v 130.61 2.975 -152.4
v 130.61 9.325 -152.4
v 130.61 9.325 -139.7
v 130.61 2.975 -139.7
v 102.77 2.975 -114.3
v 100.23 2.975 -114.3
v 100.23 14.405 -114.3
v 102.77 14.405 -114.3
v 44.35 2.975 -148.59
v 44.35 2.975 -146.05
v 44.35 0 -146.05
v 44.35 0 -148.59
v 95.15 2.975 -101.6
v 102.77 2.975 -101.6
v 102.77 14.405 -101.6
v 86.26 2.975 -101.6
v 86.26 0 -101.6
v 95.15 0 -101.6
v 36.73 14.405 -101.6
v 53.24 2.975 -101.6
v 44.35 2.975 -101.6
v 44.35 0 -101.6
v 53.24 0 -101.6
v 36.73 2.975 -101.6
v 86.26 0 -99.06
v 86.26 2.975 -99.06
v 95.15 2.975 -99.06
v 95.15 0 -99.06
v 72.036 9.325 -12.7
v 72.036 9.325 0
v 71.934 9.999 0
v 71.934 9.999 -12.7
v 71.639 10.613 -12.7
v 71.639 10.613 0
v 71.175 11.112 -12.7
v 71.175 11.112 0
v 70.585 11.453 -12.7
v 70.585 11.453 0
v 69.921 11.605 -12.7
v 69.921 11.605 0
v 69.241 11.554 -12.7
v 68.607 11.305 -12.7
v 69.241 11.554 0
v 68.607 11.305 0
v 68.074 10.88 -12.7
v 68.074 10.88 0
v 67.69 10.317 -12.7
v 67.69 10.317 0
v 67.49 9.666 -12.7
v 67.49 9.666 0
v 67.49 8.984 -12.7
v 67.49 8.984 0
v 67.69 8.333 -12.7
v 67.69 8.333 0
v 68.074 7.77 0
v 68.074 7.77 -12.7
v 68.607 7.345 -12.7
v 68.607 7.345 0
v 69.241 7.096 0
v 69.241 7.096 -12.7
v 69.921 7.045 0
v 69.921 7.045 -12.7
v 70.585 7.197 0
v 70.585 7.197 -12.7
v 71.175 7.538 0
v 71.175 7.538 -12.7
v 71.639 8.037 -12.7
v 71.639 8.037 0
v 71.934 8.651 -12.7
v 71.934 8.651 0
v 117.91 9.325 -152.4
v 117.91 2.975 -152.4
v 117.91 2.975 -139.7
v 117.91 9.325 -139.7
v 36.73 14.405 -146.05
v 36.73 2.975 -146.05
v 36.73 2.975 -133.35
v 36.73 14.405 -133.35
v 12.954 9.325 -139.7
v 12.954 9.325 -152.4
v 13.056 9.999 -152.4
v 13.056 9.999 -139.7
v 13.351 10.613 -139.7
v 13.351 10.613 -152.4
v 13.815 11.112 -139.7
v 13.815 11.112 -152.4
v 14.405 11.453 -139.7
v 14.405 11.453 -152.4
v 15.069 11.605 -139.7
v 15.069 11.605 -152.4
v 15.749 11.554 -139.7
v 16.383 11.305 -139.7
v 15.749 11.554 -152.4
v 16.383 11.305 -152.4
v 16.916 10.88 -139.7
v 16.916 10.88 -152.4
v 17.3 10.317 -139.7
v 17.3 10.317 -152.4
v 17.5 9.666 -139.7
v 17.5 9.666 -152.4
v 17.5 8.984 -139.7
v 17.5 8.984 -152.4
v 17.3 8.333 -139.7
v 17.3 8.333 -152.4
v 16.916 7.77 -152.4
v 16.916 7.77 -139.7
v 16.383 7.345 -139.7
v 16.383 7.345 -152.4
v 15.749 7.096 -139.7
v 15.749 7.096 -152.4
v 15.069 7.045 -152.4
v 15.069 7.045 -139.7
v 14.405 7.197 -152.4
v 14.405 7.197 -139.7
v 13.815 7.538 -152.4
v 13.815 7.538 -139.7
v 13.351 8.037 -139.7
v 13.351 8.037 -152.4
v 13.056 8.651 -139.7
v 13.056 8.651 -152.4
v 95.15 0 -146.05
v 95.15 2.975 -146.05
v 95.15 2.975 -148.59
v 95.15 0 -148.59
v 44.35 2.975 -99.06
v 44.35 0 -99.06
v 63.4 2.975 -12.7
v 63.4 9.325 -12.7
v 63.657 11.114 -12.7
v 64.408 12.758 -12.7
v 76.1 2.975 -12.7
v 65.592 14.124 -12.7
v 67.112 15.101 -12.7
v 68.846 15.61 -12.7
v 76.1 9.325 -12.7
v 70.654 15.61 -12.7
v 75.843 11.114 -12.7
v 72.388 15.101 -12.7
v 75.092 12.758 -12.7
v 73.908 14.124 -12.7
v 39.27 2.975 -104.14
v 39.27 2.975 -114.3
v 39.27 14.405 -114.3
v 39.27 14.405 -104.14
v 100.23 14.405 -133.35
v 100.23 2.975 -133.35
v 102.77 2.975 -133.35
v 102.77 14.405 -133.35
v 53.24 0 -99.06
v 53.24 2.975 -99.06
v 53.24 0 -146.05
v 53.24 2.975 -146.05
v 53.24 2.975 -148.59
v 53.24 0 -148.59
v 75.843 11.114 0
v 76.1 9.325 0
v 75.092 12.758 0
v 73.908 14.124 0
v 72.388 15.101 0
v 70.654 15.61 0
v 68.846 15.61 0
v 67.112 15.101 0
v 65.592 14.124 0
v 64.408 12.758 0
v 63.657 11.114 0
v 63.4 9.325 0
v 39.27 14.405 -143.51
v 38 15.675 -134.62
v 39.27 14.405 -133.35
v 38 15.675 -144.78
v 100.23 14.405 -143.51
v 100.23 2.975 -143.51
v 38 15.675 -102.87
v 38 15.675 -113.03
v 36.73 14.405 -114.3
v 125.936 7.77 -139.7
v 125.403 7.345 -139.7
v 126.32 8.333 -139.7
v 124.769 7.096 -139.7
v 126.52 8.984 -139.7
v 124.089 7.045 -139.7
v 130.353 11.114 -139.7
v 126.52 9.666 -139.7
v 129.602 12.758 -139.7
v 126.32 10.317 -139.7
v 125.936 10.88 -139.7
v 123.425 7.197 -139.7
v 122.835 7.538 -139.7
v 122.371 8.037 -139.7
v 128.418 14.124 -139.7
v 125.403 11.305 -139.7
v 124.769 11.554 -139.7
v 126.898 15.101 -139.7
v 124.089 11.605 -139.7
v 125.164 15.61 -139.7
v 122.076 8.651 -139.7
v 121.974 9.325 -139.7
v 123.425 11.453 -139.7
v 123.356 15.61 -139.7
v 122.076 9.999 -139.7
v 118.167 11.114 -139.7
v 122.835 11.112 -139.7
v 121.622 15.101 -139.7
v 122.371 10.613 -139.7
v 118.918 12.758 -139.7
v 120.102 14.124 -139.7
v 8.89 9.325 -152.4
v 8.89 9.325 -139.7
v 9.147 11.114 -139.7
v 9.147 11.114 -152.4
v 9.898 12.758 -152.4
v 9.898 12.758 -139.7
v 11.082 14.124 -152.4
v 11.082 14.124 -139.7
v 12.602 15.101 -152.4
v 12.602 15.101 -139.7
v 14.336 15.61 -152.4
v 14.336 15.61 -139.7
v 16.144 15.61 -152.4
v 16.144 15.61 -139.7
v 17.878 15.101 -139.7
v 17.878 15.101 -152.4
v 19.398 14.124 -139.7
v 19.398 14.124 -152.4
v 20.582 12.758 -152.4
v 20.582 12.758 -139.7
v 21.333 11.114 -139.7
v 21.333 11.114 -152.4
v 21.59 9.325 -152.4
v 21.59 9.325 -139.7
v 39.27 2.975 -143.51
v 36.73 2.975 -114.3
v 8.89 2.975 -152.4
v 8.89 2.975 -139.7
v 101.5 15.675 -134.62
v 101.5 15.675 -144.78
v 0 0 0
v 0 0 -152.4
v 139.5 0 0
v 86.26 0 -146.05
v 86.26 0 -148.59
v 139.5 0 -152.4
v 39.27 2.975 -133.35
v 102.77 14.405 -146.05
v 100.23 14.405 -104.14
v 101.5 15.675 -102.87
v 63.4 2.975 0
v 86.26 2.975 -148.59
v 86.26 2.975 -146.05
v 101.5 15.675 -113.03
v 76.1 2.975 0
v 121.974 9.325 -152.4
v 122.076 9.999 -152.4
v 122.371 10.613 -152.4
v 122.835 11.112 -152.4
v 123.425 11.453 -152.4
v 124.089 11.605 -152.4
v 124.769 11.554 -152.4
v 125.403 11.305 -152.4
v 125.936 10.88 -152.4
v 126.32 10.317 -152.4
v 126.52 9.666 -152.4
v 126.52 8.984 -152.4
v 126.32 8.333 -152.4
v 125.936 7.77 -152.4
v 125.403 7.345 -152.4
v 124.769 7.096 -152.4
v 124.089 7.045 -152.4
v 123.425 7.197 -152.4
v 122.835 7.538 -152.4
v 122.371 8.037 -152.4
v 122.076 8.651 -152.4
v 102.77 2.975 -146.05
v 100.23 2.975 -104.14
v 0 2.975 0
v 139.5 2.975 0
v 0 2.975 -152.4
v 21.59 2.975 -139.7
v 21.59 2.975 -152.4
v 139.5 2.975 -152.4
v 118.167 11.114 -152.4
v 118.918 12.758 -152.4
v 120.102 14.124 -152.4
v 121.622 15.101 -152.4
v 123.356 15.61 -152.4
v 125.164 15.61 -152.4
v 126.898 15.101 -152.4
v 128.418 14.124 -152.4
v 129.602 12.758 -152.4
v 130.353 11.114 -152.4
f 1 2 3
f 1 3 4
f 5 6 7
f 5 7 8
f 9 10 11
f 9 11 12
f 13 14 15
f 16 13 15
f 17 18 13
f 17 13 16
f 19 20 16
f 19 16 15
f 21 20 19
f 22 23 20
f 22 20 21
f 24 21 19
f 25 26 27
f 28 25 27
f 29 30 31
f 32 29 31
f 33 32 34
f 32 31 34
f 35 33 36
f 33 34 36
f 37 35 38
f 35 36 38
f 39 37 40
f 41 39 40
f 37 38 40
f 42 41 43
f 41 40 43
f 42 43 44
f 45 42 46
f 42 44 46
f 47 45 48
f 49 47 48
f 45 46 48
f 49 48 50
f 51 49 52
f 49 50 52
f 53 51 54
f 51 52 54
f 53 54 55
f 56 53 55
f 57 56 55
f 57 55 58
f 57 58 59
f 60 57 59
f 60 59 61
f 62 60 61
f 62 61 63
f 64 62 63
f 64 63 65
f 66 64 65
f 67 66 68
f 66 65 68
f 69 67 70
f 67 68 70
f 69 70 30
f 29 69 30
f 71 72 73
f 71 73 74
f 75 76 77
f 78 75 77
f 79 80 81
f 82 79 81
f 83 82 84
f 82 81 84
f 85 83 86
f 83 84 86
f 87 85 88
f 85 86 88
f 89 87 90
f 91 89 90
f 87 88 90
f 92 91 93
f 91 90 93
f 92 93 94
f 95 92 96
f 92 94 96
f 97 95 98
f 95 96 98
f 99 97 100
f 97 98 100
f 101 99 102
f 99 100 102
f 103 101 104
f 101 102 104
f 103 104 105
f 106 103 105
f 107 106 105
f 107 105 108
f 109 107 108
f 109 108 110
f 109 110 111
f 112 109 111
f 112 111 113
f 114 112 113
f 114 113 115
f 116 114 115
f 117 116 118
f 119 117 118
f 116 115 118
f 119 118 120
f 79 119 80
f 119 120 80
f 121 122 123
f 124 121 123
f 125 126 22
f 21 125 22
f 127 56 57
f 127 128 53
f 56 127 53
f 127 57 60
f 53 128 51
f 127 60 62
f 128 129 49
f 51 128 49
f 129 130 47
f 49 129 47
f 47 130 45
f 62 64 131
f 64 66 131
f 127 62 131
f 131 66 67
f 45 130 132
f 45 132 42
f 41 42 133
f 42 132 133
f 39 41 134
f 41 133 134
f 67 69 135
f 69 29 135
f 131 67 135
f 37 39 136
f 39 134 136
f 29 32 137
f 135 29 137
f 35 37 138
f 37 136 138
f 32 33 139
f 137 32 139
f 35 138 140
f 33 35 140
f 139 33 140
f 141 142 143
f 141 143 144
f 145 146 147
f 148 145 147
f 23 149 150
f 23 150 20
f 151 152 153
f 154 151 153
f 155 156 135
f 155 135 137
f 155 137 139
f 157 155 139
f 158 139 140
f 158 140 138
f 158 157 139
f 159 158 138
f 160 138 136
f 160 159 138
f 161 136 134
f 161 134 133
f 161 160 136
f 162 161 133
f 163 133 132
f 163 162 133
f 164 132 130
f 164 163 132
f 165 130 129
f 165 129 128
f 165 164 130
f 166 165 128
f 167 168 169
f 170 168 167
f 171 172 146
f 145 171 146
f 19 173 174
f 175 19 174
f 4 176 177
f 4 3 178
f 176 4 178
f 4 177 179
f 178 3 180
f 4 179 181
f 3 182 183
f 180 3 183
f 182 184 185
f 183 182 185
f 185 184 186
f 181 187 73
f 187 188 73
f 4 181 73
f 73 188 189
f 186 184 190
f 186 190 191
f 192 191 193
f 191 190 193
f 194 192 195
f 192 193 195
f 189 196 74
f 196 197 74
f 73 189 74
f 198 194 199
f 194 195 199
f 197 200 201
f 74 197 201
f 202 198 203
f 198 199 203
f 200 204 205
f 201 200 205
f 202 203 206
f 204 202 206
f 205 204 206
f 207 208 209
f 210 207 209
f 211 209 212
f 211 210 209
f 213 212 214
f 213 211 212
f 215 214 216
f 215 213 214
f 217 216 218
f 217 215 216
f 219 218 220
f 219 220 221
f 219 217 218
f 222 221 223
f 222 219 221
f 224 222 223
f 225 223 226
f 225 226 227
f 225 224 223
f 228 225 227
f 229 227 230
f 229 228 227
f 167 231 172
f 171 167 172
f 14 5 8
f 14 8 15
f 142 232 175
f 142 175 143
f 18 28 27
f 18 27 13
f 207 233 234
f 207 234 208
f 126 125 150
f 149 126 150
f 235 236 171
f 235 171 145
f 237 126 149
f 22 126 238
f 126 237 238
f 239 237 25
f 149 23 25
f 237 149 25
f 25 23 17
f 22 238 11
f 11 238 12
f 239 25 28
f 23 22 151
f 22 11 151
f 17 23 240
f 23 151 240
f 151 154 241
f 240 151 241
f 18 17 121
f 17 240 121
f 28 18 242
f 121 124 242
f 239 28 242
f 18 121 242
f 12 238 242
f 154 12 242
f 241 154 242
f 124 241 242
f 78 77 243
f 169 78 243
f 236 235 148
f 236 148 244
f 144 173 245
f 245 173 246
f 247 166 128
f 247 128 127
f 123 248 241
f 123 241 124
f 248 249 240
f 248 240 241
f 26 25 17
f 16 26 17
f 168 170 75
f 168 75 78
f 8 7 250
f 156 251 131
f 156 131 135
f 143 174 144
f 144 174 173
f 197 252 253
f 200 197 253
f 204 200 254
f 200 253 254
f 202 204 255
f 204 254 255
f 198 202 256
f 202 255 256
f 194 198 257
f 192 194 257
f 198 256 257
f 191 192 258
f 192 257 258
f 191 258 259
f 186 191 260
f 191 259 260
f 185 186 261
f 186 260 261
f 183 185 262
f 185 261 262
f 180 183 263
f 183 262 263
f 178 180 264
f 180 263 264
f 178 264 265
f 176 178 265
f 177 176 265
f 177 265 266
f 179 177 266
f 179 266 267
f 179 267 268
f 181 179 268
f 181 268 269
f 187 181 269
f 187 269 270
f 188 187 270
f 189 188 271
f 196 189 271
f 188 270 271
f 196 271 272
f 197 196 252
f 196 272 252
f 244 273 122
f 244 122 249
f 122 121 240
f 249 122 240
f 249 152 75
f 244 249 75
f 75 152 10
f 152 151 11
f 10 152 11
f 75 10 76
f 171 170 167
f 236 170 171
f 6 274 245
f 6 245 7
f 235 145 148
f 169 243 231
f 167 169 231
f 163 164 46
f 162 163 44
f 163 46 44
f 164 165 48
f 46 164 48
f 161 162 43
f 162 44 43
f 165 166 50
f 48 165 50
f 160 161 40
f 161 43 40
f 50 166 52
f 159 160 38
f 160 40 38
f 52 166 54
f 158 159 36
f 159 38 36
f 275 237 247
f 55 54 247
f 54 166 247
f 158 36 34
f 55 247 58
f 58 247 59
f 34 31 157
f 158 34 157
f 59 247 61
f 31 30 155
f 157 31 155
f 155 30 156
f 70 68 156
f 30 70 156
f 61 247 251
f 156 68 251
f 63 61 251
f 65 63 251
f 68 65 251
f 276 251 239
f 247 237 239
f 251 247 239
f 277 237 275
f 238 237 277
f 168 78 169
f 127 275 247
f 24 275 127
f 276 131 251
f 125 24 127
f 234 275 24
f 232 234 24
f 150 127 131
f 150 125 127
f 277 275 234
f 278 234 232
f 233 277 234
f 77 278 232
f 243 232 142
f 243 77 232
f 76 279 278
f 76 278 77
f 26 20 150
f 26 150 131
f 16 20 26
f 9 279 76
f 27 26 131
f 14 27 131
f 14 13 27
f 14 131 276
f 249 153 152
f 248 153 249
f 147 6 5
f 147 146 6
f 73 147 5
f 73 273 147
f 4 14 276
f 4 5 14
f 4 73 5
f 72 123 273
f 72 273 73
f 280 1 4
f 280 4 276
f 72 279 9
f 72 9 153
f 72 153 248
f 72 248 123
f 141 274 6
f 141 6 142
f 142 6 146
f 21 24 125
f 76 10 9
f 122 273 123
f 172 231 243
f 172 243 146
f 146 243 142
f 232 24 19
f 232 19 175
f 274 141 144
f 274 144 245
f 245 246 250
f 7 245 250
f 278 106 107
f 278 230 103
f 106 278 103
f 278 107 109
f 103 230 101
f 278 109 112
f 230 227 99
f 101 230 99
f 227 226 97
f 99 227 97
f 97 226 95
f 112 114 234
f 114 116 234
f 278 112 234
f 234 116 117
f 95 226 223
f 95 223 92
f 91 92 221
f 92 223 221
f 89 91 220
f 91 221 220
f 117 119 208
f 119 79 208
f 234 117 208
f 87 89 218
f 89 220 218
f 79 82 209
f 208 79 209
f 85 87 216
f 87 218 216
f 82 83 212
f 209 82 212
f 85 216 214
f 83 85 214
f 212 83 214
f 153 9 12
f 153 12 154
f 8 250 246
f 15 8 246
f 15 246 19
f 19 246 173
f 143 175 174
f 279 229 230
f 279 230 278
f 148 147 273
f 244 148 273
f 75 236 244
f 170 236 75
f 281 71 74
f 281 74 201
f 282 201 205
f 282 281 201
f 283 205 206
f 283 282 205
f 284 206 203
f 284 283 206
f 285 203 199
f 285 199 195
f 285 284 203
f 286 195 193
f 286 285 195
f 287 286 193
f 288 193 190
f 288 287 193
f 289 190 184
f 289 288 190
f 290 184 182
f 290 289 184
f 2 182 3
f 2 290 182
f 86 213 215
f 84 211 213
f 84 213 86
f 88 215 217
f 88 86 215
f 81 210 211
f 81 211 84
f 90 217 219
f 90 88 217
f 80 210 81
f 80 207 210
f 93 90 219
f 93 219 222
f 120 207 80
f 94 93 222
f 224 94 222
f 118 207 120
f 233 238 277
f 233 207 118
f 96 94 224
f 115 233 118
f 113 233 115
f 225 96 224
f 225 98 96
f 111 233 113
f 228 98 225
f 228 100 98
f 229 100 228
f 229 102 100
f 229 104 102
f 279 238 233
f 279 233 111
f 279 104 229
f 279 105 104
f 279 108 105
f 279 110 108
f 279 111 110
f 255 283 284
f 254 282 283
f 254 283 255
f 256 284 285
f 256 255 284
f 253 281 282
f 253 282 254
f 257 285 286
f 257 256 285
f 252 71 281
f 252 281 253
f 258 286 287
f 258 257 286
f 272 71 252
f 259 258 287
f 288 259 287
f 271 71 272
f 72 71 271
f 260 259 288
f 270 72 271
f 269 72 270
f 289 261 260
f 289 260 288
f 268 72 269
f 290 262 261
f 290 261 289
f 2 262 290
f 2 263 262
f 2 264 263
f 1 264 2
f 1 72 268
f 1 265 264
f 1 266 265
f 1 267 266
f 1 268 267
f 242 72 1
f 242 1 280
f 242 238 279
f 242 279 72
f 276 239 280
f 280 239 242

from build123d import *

# Parameters (mm, degrees)
SKETCH1_W           = 139.5
SKETCH1_H           = 152.4
BOSS_EXTRUDE1_DEPTH = 6.35
SKETCH2_W           = 139.5
SKETCH2_H           = 152.4
CUT_EXTRUDE1_DEPTH  = 3.375
SKETCH3_R           = 2.286
BOSS_EXTRUDE2_DEPTH = 12.7
SKETCH4_R           = 2.286
BOSS_EXTRUDE3_DEPTH = 12.7
BOSS_EXTRUDE4_DEPTH = 12.7
CHAMFER1_SIZE       = 1.27
SKETCH6_W           = 8.89
SKETCH6_H           = 2.54
CUT_EXTRUDE2_DEPTH  = 207.995893689


with BuildPart() as part:
    # Sketch1 → Boss-Extrude1 (new body)
    with BuildSketch(Plane(origin=(0, 0, 0), x_dir=(1, 0, 0), z_dir=(0, 1, 0))):
        with Locations((69.75, 76.2)):
            Rectangle(SKETCH1_W, SKETCH1_H)
    extrude(amount=BOSS_EXTRUDE1_DEPTH)

    # Sketch2 → Cut-Extrude1 (cut)
    with BuildSketch(Plane(origin=(0, 6.35, 0), x_dir=(1, 0, 0), z_dir=(0, 1, 0))):
        with Locations((69.75, 76.2)):
            Rectangle(SKETCH2_W, SKETCH2_H)
    extrude(amount=-CUT_EXTRUDE1_DEPTH, mode=Mode.SUBTRACT)

    # Sketch3 → Boss-Extrude2 (add)
    with BuildSketch(Plane.XY):
        with BuildLine():
            Line((63.4, 9.325), (63.4, 2.975))
            Line((63.4, 2.975), (76.1, 2.975))
            Line((76.1, 2.975), (76.1, 9.325000158))
            ThreePointArc((76.1, 9.325000158), (69.749999921, 15.675000158), (63.4, 9.325))
        make_face()
        with Locations((69.75, 9.325000158)):
            Circle(SKETCH3_R, mode=Mode.SUBTRACT)
    extrude(amount=-BOSS_EXTRUDE2_DEPTH)

    # Sketch4 → Boss-Extrude3 (add)
    # profile 1 of 2: a face of its own
    with BuildSketch(Plane(origin=(0, 0, -152.4), x_dir=(-1, 0, 0), z_dir=(0, 0, -1))):
        with BuildLine():
            Line((-130.61, 9.325), (-130.61, 2.975))
            Line((-130.61, 2.975), (-117.91, 2.975))
            Line((-117.91, 2.975), (-117.91, 9.325))
            ThreePointArc((-117.91, 9.325), (-124.26, 15.675), (-130.61, 9.325))
        make_face()
        with Locations((-124.26, 9.325)):
            Circle(SKETCH4_R, mode=Mode.SUBTRACT)
    # profile 2 of 2: a face of its own
    with BuildSketch(Plane(origin=(0, 0, -152.4), x_dir=(-1, 0, 0), z_dir=(0, 0, -1))):
        with BuildLine():
            Line((-21.59, 9.325), (-21.59, 2.975))
            Line((-21.59, 2.975), (-8.89, 2.975))
            Line((-8.89, 2.975), (-8.89, 9.325))
            ThreePointArc((-8.89, 9.325), (-15.24, 15.675), (-21.59, 9.325))
        make_face()
        with Locations((-15.24, 9.325)):
            Circle(SKETCH4_R, mode=Mode.SUBTRACT)
    extrude(amount=-BOSS_EXTRUDE3_DEPTH)

    # Sketch5 → Boss-Extrude4 (add)
    with BuildSketch(Plane(origin=(0, 2.975, 0), x_dir=(1, 0, 0), z_dir=(0, 1, 0))):
        Polygon((36.73, 146.05), (36.73, 133.35), (39.27, 133.35), (39.27, 143.51), (100.23, 143.51), (100.23, 133.35), (102.77, 133.35), (102.77, 146.05), align=None)
        Polygon((39.27, 104.14), (100.23, 104.14), (100.23, 114.3), (102.77, 114.3), (102.77, 101.6), (36.73, 101.6), (36.73, 114.3), (39.27, 114.3), align=None)
    extrude(amount=BOSS_EXTRUDE4_DEPTH)

    # Chamfer1
    chamfer1_edges = [part.edges().sort_by_distance(p)[0] for p in [
        (100.23, 15.675, -109.22),
        (69.75, 15.675, -104.14),
        (39.27, 15.675, -109.22),
        (38, 15.675, -114.3),
        (36.73, 15.675, -107.95),
        (69.75, 15.675, -101.6),
        (102.77, 15.675, -107.95),
        (101.5, 15.675, -114.3),
        (39.27, 15.675, -138.43),
        (69.75, 15.675, -143.51),
        (100.23, 15.675, -138.43),
        (101.5, 15.675, -133.35),
        (102.77, 15.675, -139.7),
        (69.75, 15.675, -146.05),
        (36.73, 15.675, -139.7),
        (38, 15.675, -133.35),
    ]]
    chamfer(chamfer1_edges, length=CHAMFER1_SIZE - 0.0001)  # a hair under: the kernel refuses the full size

    # Sketch6 → Cut-Extrude2 (cut, through all)
    with BuildSketch(Plane(origin=(0, 2.975, 0), x_dir=(1, 0, 0), z_dir=(0, 1, 0))):
        with Locations((48.795, 147.32)):
            Rectangle(SKETCH6_W, SKETCH6_H)
        with Locations((90.705, 147.32)):
            Rectangle(SKETCH6_W, SKETCH6_H)
        with Locations((48.795, 100.33)):
            Rectangle(SKETCH6_W, SKETCH6_H)
        with Locations((90.705, 100.33)):
            Rectangle(SKETCH6_W, SKETCH6_H)
    extrude(amount=-CUT_EXTRUDE2_DEPTH, mode=Mode.SUBTRACT)


solid = part.part
